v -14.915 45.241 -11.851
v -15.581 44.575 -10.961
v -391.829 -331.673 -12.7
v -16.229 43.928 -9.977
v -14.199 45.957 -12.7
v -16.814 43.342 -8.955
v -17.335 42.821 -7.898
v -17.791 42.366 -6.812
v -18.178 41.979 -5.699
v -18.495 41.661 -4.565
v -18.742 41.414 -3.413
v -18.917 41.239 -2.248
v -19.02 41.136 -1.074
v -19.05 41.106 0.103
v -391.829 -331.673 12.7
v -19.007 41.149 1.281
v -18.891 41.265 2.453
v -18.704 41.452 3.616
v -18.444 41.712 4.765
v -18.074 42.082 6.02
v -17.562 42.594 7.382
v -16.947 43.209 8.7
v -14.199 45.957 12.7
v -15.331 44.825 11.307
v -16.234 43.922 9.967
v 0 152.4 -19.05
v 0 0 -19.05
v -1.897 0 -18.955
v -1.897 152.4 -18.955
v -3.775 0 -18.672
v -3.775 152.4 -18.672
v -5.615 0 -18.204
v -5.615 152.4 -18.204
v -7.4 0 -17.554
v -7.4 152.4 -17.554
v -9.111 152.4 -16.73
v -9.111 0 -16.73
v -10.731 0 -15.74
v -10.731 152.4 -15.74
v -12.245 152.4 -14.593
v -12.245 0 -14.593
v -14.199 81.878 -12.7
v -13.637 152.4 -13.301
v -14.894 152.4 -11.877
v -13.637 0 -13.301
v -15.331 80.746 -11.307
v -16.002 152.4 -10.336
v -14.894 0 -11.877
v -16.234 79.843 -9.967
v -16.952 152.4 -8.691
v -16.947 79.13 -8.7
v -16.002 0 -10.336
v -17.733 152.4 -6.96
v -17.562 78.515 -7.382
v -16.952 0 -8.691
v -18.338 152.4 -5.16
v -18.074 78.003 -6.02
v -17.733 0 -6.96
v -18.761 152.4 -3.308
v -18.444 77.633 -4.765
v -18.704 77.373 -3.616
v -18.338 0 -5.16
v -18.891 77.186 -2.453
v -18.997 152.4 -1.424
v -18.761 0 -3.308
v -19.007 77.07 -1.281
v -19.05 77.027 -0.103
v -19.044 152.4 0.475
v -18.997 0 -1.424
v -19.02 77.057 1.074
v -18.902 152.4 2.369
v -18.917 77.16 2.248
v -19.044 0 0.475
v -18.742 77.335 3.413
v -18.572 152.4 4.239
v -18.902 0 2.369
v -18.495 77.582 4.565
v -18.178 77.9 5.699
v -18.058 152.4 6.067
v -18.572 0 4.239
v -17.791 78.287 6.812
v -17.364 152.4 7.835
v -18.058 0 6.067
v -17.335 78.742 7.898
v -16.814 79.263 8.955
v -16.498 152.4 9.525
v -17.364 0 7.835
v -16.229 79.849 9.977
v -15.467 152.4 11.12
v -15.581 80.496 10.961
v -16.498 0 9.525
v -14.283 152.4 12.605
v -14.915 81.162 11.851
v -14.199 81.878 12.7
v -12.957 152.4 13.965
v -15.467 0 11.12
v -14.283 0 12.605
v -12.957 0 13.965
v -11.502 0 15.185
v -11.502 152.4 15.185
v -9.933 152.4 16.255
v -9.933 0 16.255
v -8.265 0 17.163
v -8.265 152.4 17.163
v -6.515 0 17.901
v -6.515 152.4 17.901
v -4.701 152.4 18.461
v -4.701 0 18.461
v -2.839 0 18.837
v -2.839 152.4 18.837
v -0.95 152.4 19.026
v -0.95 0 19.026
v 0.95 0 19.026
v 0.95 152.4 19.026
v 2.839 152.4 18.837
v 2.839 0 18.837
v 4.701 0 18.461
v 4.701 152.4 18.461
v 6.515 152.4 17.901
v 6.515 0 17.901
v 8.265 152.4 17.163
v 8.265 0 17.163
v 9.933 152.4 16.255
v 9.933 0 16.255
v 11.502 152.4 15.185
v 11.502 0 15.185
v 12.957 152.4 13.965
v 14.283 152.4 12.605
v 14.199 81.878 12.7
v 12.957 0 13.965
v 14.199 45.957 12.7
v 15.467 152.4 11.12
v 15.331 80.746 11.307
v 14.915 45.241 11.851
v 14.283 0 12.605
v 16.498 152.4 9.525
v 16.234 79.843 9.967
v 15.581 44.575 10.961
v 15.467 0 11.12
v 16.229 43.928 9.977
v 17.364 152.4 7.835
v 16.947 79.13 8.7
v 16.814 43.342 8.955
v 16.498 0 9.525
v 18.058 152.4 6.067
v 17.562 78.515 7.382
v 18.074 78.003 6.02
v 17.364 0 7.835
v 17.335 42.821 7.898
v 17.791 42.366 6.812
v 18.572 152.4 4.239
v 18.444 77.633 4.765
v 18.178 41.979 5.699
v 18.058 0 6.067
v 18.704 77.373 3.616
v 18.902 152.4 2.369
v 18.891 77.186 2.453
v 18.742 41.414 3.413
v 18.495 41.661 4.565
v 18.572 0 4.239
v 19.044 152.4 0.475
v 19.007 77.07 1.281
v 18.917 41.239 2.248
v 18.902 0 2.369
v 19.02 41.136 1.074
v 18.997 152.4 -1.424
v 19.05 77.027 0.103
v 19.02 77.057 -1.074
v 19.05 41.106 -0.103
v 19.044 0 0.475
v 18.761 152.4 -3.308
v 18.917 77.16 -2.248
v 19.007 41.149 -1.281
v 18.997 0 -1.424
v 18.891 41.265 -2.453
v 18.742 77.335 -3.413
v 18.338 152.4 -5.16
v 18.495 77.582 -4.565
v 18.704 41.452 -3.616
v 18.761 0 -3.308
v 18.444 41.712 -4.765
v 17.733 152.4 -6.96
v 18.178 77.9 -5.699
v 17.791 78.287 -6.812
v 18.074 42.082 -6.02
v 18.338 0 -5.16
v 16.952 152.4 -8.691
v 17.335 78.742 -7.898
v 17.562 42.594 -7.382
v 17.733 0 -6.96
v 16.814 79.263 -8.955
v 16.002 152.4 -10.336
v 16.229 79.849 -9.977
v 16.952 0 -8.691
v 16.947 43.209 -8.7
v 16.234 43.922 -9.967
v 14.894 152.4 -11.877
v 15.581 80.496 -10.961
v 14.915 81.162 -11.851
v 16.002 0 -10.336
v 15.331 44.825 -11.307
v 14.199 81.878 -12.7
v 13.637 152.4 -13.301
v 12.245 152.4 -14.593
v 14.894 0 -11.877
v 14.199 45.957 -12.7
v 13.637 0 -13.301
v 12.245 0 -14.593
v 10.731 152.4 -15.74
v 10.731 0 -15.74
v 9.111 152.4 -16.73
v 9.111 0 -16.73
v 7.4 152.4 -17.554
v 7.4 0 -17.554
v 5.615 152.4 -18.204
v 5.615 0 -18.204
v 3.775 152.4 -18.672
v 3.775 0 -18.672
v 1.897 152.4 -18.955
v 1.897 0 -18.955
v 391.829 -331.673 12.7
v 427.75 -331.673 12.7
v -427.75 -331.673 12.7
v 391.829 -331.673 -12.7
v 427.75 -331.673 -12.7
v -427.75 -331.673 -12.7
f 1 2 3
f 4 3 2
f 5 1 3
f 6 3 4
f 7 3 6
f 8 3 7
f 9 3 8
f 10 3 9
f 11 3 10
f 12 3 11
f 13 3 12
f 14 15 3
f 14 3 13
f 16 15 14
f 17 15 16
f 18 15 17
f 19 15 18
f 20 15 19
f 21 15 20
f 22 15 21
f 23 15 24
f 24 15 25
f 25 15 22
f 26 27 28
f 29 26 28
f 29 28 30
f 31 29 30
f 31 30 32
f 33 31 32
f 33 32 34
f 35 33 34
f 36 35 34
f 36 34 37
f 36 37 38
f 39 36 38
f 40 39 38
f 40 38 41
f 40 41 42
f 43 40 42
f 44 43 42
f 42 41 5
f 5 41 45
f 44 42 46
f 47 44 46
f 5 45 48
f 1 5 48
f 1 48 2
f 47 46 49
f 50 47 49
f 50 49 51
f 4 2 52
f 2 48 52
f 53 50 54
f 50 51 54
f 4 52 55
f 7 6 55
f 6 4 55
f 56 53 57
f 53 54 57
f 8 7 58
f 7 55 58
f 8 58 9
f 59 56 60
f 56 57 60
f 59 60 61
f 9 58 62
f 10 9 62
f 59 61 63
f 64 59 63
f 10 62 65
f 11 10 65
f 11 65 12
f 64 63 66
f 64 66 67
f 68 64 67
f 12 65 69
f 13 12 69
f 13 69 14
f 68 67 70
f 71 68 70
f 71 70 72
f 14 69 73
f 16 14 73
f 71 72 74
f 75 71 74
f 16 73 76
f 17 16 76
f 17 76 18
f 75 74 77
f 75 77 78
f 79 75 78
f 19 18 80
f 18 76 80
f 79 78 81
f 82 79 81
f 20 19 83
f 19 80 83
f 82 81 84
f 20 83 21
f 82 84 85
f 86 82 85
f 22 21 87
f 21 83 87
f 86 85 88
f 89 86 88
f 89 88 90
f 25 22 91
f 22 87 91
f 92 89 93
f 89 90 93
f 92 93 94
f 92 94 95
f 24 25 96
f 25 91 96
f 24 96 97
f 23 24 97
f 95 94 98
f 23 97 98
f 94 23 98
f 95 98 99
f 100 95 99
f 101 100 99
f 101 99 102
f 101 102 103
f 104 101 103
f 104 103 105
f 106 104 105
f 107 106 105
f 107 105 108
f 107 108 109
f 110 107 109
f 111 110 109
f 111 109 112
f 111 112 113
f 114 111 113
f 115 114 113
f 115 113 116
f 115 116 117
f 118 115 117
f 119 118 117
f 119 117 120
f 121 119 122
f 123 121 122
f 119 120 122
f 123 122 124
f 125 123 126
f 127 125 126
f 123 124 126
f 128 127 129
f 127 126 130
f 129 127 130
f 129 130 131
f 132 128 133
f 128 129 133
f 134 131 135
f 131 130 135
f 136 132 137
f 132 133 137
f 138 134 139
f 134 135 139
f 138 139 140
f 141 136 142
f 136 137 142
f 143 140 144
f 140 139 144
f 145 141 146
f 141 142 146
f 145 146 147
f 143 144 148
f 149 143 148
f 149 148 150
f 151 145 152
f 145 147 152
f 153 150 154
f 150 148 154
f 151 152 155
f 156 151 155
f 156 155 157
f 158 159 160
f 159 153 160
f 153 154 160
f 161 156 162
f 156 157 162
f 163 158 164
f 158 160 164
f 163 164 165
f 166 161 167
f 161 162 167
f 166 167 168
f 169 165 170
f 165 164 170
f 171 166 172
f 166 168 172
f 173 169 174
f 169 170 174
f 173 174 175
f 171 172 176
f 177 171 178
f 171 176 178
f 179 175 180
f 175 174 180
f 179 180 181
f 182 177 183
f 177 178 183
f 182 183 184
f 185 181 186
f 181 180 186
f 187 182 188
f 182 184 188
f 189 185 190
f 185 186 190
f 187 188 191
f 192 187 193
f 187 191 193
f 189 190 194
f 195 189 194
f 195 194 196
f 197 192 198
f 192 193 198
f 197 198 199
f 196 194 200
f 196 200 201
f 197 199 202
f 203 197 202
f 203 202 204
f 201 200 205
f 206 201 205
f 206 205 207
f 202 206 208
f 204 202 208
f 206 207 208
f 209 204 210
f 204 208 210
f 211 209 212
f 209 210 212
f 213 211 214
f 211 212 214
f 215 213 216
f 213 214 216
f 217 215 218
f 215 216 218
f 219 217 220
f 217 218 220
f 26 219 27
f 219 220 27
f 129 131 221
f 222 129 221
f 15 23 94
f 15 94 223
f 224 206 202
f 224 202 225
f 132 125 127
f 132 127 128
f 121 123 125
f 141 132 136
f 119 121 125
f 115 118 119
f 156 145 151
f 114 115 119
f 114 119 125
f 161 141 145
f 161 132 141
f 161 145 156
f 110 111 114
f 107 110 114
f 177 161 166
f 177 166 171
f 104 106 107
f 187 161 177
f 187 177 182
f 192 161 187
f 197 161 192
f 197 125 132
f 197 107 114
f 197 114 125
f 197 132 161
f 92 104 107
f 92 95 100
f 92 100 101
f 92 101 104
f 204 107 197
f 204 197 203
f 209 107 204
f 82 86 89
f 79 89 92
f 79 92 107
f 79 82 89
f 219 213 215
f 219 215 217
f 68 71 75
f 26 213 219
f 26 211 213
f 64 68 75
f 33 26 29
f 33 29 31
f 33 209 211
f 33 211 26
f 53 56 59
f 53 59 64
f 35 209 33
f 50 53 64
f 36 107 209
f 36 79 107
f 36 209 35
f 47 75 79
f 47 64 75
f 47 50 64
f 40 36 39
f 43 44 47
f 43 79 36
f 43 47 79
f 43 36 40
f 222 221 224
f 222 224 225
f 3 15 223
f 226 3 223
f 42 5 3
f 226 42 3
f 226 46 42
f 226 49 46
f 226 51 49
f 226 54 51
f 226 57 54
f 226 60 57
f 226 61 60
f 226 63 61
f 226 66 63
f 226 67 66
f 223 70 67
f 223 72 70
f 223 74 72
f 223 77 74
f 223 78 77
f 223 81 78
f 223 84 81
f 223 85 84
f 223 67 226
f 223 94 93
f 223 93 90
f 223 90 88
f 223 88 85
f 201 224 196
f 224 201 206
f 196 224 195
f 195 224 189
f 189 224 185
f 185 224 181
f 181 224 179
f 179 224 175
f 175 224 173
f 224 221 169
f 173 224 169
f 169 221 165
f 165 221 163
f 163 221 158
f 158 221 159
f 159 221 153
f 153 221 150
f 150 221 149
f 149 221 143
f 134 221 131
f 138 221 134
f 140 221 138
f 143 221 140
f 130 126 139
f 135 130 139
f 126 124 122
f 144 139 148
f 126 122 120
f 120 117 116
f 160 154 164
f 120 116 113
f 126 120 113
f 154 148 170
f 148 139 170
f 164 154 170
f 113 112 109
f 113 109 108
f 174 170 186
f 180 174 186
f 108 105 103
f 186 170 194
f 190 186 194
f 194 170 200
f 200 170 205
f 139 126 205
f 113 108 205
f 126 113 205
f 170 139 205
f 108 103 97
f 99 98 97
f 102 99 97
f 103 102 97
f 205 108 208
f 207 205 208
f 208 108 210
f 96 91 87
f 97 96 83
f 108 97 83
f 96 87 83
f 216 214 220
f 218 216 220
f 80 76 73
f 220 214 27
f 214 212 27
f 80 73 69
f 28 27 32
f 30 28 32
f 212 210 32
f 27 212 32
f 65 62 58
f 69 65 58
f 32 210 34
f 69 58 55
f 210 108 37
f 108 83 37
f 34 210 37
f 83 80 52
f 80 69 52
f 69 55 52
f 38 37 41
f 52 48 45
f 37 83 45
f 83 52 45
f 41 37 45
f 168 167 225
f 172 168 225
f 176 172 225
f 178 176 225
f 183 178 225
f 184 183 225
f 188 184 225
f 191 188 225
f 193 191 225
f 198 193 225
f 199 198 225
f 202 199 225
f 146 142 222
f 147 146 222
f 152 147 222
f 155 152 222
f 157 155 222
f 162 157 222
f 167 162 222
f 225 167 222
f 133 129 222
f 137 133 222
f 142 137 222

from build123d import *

# Parameters (mm, degrees)
SKETCH2_R           = 19.05
BOSS_EXTRUDE1_DEPTH = 152.4
BOSS_EXTRUDE2_DEPTH = 12.7


with BuildPart() as part:
    # Sketch2 → Boss-Extrude1 (new body)
    with BuildSketch(Plane(origin=(0, 0, 0), x_dir=(1, 0, 0), z_dir=(0, 1, 0))):
        with Locations(Location((0, 0, 0), (0, 0, 90))):
            Circle(SKETCH2_R)
    extrude(amount=BOSS_EXTRUDE1_DEPTH)

    # Sketch3 → Boss-Extrude2 (add, symmetric)
    with BuildSketch(Plane.XY):
        Polygon((-427.750314484, -331.6732), (-409.789802242, -313.712687758), (-391.82929, -331.6732), align=None)
        Polygon((-6.028675512, 90.048438972), (-409.789802242, -313.712687758), (-391.82929, -331.6732), (11.93183673, 72.08792673), align=None)
    boss_extrude2 = extrude(amount=BOSS_EXTRUDE2_DEPTH, both=True)

    # Mirror1: Boss-Extrude2 across plane
    add(boss_extrude2.mirror(Plane(origin=(0, 0, 0), x_dir=(0, 0, 1), z_dir=(1, 0, 0))))


solid = part.part
